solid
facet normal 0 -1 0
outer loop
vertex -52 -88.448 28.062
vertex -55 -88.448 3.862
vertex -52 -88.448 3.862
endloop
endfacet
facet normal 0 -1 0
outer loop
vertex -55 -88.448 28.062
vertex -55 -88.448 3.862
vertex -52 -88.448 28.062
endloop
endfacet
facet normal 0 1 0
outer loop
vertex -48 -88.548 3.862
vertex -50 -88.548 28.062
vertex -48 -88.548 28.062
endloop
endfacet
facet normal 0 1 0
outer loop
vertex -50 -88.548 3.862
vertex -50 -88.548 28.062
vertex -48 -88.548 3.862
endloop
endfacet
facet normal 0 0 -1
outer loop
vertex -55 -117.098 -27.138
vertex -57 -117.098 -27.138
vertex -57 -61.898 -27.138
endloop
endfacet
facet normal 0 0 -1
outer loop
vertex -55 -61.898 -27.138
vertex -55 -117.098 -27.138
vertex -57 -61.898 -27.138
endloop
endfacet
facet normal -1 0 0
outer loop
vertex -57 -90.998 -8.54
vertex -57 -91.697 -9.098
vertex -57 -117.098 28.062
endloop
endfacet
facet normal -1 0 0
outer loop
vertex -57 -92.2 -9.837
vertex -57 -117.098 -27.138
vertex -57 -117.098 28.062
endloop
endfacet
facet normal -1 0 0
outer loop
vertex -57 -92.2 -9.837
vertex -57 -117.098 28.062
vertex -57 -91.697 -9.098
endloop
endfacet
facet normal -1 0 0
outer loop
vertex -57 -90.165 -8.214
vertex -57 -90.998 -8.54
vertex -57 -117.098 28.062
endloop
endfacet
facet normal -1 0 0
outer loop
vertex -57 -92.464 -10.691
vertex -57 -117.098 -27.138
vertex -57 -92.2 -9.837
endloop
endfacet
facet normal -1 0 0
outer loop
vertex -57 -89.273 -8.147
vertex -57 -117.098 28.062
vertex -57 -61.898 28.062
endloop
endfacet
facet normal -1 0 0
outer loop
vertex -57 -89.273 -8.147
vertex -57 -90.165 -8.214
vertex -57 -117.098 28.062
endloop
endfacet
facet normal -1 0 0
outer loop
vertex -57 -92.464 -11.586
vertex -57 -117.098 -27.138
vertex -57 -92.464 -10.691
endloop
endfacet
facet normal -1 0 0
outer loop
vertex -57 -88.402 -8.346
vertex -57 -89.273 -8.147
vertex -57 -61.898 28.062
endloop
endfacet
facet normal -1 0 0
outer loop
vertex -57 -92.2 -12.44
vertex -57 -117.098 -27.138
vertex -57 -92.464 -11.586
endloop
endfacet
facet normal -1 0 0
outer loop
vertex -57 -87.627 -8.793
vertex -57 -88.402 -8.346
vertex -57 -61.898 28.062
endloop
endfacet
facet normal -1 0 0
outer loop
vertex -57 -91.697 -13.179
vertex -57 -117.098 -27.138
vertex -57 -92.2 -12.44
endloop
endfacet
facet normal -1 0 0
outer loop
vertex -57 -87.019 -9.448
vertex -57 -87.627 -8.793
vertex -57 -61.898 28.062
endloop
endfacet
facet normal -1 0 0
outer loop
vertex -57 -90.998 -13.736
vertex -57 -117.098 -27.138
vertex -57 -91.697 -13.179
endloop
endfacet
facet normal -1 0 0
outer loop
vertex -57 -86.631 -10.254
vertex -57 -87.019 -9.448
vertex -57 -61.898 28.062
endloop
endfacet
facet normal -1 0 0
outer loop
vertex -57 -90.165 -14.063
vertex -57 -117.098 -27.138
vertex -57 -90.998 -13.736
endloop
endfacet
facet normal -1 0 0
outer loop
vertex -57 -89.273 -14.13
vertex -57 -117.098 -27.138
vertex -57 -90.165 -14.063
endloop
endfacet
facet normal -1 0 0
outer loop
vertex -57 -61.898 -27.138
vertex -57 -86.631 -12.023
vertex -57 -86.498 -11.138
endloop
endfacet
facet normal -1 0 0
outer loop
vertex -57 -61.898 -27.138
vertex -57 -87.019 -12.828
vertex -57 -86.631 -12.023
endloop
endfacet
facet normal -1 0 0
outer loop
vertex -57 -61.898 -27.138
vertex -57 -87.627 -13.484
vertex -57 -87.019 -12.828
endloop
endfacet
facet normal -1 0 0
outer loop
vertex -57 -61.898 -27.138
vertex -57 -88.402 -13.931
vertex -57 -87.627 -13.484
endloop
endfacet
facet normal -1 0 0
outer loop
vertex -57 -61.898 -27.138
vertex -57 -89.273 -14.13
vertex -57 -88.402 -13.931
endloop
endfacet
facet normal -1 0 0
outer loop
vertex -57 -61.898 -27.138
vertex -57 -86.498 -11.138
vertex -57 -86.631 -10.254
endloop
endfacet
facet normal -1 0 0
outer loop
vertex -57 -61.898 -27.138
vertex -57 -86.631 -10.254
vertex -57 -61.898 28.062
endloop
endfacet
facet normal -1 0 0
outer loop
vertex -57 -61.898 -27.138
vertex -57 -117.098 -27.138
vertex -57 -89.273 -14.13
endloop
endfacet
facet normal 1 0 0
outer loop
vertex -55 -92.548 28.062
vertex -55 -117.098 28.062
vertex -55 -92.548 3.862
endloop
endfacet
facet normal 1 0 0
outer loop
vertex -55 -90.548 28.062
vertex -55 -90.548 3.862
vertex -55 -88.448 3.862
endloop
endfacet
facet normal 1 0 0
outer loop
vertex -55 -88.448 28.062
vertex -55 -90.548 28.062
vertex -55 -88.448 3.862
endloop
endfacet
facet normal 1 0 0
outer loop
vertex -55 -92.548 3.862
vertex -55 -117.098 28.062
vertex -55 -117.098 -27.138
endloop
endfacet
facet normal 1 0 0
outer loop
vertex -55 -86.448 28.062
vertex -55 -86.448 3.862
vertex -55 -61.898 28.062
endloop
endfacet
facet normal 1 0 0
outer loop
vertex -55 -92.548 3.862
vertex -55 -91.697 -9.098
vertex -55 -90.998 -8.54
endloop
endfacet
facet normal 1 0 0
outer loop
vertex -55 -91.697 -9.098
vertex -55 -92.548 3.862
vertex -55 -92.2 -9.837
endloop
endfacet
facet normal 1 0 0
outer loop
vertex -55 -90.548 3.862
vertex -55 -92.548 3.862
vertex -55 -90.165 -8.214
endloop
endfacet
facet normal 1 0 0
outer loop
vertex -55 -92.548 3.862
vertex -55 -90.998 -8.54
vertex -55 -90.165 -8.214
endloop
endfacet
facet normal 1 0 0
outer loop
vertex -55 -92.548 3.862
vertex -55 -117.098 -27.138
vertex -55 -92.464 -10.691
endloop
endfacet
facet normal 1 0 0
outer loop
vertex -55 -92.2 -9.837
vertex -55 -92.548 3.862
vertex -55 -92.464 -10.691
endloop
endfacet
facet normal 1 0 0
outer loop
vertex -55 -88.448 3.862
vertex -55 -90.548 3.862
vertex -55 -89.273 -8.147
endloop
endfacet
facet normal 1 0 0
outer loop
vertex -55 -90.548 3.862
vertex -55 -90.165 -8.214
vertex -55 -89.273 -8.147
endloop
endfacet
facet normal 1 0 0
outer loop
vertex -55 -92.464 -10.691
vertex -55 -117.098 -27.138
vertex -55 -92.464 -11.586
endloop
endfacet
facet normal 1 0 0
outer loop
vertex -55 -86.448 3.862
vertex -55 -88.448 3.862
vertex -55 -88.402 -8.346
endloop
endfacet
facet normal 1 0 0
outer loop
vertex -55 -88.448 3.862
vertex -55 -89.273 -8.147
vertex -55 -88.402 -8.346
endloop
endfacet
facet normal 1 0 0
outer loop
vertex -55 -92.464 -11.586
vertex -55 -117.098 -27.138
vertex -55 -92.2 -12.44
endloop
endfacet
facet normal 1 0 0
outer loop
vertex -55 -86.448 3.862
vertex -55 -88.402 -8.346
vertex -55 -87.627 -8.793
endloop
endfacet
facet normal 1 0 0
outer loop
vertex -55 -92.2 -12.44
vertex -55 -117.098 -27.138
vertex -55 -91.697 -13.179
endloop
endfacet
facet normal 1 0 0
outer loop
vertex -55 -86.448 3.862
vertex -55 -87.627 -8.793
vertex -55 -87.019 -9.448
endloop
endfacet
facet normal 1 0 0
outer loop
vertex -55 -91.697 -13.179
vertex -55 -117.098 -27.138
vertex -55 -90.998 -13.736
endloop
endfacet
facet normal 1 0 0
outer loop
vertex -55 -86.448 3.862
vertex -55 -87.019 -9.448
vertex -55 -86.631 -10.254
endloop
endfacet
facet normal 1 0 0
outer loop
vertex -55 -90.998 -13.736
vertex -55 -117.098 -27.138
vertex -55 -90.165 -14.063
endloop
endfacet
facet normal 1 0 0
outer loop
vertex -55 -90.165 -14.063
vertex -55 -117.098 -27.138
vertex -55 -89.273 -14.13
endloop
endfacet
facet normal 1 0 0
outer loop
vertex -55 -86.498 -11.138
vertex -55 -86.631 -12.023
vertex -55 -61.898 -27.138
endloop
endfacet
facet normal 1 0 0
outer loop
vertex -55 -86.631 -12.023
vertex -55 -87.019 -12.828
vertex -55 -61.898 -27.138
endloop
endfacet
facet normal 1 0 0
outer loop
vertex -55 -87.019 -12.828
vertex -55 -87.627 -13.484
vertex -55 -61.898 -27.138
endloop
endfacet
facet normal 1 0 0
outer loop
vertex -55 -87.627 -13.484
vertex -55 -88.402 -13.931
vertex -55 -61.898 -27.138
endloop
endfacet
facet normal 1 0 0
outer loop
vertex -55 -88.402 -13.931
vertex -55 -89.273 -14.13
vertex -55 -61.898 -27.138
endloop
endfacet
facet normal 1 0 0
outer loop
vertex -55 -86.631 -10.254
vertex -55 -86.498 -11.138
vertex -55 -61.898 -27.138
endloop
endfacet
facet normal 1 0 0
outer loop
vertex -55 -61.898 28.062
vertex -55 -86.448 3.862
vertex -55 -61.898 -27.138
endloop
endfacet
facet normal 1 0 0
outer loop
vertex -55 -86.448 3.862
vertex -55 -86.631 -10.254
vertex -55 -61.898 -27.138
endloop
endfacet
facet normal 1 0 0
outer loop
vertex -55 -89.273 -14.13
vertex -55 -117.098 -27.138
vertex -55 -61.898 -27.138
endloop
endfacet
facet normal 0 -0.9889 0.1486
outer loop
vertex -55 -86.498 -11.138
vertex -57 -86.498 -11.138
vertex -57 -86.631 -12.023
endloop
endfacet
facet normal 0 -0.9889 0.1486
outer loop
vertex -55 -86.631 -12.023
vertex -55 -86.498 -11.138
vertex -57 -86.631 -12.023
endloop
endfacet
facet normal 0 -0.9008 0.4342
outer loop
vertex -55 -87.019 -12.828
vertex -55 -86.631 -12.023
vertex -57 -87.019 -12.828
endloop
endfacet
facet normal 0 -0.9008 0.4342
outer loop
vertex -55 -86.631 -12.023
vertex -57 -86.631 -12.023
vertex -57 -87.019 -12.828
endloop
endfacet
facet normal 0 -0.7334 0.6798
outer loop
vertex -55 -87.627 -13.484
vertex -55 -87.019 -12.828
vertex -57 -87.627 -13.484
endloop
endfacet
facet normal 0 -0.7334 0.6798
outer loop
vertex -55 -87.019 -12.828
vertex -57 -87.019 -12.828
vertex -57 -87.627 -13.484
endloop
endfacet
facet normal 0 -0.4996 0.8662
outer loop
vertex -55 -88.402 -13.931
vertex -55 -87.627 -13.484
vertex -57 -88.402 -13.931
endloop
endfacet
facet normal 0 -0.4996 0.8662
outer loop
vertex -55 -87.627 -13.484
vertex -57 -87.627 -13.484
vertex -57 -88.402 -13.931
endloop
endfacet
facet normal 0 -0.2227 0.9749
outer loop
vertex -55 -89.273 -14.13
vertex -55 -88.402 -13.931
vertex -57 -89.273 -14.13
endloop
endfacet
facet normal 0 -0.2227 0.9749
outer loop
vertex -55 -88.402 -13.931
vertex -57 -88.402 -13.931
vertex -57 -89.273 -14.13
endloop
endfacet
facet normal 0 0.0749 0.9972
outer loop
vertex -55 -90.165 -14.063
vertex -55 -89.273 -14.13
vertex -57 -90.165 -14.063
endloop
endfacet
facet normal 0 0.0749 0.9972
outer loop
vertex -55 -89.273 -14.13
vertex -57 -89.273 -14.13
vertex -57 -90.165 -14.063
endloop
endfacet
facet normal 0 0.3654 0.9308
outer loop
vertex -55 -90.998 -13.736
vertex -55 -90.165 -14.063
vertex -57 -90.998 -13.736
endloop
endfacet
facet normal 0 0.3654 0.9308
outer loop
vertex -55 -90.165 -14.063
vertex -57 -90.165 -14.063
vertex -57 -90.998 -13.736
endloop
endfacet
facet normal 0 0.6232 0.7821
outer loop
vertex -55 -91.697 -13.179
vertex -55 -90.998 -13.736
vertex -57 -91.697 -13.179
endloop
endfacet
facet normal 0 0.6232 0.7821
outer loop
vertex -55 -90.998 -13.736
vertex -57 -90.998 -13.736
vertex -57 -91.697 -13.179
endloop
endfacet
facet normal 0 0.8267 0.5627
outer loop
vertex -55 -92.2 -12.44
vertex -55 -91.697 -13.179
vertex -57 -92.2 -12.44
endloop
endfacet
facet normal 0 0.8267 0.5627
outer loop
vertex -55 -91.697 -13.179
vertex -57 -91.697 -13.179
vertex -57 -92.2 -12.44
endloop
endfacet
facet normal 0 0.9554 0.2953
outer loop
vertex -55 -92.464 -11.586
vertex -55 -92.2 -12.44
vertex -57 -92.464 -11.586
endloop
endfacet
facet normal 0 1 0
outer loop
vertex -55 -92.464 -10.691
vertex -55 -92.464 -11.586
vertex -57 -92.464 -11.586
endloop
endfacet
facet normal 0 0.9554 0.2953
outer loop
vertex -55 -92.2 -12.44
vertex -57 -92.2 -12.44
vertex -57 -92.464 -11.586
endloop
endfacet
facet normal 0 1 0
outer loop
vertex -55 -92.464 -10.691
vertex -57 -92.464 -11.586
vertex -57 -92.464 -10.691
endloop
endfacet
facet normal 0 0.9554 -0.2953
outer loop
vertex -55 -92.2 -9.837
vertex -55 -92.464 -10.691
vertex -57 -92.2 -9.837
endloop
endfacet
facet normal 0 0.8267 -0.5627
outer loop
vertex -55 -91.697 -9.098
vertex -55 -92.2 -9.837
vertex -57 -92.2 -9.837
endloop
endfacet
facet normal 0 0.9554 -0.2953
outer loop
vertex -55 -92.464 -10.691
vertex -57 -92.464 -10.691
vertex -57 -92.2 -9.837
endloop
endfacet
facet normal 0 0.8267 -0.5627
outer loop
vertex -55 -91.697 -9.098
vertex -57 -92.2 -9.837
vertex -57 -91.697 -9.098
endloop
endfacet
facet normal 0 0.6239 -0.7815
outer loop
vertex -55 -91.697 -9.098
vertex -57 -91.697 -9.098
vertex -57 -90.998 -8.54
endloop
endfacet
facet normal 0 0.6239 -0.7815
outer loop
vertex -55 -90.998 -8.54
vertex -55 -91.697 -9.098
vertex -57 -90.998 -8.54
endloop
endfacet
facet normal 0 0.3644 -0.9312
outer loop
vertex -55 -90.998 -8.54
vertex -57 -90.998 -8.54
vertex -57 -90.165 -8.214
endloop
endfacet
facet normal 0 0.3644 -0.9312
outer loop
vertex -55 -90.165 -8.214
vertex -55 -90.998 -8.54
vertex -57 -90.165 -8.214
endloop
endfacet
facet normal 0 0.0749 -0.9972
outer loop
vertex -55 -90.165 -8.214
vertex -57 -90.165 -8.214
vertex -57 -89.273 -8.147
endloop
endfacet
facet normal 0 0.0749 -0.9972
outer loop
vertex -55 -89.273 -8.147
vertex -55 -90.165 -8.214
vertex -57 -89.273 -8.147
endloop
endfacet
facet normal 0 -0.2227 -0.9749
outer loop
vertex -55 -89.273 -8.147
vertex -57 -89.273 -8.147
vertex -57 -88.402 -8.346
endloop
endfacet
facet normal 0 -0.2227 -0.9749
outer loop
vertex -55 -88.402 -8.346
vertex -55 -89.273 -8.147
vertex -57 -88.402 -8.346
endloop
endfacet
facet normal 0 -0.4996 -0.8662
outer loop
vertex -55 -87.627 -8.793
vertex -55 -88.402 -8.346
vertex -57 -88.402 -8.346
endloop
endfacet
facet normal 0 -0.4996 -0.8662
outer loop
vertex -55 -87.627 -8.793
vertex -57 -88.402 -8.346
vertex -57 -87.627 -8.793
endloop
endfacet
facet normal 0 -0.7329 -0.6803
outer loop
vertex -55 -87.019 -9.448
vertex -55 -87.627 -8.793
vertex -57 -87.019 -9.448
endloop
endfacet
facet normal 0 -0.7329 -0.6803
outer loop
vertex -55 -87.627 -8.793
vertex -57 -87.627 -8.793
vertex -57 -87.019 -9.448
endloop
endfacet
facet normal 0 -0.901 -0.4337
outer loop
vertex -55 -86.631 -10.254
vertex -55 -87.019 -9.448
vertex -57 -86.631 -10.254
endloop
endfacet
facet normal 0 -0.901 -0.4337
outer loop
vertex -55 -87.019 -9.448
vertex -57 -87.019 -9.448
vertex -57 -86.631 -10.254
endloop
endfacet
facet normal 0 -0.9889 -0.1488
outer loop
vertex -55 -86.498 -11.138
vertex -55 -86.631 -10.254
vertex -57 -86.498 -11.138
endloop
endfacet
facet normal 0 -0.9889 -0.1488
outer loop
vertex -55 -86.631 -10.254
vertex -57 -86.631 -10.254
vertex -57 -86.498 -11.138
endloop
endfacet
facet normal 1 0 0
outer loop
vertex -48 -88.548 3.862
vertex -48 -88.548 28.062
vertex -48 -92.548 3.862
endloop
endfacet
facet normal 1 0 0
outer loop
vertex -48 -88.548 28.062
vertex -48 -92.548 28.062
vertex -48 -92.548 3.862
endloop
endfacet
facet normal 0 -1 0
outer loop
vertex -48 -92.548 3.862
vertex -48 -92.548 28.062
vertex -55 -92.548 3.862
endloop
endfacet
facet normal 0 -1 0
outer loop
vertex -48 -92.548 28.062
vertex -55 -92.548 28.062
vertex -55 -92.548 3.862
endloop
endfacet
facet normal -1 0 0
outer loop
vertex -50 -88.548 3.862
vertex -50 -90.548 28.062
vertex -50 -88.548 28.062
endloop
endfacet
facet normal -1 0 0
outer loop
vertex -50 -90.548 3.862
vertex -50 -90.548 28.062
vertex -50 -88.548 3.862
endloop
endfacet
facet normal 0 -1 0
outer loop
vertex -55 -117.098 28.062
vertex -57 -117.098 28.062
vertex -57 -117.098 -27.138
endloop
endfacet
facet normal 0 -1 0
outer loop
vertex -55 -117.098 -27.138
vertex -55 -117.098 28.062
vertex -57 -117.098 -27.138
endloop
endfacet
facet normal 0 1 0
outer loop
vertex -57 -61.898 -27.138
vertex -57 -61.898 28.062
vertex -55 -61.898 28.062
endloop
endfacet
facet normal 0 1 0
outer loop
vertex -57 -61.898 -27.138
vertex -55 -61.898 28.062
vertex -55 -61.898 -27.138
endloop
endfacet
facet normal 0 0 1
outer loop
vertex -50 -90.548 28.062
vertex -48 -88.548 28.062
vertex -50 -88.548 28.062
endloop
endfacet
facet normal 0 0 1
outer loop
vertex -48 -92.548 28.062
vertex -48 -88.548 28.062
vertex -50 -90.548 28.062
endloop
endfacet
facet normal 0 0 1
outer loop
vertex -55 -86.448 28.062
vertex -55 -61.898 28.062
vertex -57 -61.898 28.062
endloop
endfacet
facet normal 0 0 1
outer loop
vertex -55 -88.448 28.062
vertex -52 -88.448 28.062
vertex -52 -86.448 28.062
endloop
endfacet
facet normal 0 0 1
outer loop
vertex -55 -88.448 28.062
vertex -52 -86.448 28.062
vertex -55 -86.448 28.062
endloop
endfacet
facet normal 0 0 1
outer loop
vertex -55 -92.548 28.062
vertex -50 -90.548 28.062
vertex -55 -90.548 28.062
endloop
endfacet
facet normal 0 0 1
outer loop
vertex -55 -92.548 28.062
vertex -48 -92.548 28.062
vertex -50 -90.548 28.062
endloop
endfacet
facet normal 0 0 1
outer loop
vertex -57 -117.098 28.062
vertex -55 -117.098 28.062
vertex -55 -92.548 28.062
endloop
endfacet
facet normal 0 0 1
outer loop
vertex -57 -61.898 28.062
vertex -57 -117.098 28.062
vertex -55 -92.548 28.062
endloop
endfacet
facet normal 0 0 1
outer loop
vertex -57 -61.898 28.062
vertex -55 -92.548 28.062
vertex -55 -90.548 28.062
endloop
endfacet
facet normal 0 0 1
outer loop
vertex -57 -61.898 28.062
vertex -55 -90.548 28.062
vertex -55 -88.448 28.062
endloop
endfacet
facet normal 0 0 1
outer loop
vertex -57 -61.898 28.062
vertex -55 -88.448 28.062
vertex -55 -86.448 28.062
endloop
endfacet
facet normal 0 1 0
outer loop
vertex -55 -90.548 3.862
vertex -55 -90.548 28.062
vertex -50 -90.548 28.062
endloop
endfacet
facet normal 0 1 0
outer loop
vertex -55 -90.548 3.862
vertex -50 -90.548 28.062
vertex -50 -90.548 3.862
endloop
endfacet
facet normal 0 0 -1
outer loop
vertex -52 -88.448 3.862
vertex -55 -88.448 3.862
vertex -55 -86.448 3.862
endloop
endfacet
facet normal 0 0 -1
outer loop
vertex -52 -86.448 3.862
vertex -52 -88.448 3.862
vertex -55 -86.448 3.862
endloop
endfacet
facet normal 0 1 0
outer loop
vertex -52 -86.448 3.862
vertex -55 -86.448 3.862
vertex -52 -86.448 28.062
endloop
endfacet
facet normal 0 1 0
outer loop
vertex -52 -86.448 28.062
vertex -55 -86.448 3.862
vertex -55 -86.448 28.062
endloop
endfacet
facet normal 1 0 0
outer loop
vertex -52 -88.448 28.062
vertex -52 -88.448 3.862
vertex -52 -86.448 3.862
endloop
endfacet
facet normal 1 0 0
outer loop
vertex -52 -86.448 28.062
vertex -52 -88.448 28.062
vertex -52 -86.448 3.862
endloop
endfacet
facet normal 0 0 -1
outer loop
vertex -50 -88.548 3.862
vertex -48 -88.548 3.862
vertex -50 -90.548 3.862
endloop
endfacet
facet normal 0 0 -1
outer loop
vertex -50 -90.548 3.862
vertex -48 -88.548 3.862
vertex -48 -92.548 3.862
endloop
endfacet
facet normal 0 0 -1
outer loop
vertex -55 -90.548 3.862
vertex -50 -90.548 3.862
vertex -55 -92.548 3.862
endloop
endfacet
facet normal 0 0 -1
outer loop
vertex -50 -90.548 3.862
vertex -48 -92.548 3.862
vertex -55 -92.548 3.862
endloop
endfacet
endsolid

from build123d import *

# Parameters (mm, degrees)
SKETCH011_W     = 55.2
SKETCH011_H     = 55.2
SKETCH011_R     = 3
PAD007_DEPTH    = 2
SKETCH012_W     = 2
SKETCH012_H     = 24.2
PAD008_DEPTH    = 3
PAD008_FACE17_W = 2
PAD008_FACE17_H = 24.2
PAD010_DEPTH    = 4
SKETCH013_W     = 24.2
SKETCH013_H     = 2
PAD011_DEPTH    = 2


with BuildPart() as part:
    # Sketch011 (on DatumPlane) → Pad007 (new body)
    with BuildSketch(Plane(origin=(-57, 0, 0), x_dir=(0, 1, 0), z_dir=(-1, 0, 0))):
        with Locations((-89.497575, -0.4616)):
            Rectangle(SKETCH011_W, SKETCH011_H)
        with Locations((-89.497575, 11.1384)):
            Circle(SKETCH011_R, mode=Mode.SUBTRACT)
    extrude(amount=-PAD007_DEPTH)

    # Sketch012 (on Face7 of Pad007) → Pad008 (join)
    with BuildSketch(Plane.YZ.offset(-55)):
        with Locations((-87.447575, 15.9616)):
            Rectangle(SKETCH012_W, SKETCH012_H)
        with Locations((-91.547575, 15.9616)):
            Rectangle(SKETCH012_W, SKETCH012_H)
    extrude(amount=PAD008_DEPTH)

    # Pad008 Face17 → Pad010 (add)
    with BuildSketch(Plane(origin=(-52, -91.547575, 15.9616), x_dir=(0, -1, 0), z_dir=(1, 0, 0))):
        Rectangle(PAD008_FACE17_W, PAD008_FACE17_H)
    extrude(amount=PAD010_DEPTH)

    # Sketch013 (on Face20 of Pad010) → Pad011 (join)
    with BuildSketch(Plane(origin=(-57, -90.547575, 0), x_dir=(0, 0, -1), z_dir=(0, 1, 0))):
        with Locations((-15.9616, -8)):
            Rectangle(SKETCH013_W, SKETCH013_H)
    extrude(amount=PAD011_DEPTH)


solid = part.part
